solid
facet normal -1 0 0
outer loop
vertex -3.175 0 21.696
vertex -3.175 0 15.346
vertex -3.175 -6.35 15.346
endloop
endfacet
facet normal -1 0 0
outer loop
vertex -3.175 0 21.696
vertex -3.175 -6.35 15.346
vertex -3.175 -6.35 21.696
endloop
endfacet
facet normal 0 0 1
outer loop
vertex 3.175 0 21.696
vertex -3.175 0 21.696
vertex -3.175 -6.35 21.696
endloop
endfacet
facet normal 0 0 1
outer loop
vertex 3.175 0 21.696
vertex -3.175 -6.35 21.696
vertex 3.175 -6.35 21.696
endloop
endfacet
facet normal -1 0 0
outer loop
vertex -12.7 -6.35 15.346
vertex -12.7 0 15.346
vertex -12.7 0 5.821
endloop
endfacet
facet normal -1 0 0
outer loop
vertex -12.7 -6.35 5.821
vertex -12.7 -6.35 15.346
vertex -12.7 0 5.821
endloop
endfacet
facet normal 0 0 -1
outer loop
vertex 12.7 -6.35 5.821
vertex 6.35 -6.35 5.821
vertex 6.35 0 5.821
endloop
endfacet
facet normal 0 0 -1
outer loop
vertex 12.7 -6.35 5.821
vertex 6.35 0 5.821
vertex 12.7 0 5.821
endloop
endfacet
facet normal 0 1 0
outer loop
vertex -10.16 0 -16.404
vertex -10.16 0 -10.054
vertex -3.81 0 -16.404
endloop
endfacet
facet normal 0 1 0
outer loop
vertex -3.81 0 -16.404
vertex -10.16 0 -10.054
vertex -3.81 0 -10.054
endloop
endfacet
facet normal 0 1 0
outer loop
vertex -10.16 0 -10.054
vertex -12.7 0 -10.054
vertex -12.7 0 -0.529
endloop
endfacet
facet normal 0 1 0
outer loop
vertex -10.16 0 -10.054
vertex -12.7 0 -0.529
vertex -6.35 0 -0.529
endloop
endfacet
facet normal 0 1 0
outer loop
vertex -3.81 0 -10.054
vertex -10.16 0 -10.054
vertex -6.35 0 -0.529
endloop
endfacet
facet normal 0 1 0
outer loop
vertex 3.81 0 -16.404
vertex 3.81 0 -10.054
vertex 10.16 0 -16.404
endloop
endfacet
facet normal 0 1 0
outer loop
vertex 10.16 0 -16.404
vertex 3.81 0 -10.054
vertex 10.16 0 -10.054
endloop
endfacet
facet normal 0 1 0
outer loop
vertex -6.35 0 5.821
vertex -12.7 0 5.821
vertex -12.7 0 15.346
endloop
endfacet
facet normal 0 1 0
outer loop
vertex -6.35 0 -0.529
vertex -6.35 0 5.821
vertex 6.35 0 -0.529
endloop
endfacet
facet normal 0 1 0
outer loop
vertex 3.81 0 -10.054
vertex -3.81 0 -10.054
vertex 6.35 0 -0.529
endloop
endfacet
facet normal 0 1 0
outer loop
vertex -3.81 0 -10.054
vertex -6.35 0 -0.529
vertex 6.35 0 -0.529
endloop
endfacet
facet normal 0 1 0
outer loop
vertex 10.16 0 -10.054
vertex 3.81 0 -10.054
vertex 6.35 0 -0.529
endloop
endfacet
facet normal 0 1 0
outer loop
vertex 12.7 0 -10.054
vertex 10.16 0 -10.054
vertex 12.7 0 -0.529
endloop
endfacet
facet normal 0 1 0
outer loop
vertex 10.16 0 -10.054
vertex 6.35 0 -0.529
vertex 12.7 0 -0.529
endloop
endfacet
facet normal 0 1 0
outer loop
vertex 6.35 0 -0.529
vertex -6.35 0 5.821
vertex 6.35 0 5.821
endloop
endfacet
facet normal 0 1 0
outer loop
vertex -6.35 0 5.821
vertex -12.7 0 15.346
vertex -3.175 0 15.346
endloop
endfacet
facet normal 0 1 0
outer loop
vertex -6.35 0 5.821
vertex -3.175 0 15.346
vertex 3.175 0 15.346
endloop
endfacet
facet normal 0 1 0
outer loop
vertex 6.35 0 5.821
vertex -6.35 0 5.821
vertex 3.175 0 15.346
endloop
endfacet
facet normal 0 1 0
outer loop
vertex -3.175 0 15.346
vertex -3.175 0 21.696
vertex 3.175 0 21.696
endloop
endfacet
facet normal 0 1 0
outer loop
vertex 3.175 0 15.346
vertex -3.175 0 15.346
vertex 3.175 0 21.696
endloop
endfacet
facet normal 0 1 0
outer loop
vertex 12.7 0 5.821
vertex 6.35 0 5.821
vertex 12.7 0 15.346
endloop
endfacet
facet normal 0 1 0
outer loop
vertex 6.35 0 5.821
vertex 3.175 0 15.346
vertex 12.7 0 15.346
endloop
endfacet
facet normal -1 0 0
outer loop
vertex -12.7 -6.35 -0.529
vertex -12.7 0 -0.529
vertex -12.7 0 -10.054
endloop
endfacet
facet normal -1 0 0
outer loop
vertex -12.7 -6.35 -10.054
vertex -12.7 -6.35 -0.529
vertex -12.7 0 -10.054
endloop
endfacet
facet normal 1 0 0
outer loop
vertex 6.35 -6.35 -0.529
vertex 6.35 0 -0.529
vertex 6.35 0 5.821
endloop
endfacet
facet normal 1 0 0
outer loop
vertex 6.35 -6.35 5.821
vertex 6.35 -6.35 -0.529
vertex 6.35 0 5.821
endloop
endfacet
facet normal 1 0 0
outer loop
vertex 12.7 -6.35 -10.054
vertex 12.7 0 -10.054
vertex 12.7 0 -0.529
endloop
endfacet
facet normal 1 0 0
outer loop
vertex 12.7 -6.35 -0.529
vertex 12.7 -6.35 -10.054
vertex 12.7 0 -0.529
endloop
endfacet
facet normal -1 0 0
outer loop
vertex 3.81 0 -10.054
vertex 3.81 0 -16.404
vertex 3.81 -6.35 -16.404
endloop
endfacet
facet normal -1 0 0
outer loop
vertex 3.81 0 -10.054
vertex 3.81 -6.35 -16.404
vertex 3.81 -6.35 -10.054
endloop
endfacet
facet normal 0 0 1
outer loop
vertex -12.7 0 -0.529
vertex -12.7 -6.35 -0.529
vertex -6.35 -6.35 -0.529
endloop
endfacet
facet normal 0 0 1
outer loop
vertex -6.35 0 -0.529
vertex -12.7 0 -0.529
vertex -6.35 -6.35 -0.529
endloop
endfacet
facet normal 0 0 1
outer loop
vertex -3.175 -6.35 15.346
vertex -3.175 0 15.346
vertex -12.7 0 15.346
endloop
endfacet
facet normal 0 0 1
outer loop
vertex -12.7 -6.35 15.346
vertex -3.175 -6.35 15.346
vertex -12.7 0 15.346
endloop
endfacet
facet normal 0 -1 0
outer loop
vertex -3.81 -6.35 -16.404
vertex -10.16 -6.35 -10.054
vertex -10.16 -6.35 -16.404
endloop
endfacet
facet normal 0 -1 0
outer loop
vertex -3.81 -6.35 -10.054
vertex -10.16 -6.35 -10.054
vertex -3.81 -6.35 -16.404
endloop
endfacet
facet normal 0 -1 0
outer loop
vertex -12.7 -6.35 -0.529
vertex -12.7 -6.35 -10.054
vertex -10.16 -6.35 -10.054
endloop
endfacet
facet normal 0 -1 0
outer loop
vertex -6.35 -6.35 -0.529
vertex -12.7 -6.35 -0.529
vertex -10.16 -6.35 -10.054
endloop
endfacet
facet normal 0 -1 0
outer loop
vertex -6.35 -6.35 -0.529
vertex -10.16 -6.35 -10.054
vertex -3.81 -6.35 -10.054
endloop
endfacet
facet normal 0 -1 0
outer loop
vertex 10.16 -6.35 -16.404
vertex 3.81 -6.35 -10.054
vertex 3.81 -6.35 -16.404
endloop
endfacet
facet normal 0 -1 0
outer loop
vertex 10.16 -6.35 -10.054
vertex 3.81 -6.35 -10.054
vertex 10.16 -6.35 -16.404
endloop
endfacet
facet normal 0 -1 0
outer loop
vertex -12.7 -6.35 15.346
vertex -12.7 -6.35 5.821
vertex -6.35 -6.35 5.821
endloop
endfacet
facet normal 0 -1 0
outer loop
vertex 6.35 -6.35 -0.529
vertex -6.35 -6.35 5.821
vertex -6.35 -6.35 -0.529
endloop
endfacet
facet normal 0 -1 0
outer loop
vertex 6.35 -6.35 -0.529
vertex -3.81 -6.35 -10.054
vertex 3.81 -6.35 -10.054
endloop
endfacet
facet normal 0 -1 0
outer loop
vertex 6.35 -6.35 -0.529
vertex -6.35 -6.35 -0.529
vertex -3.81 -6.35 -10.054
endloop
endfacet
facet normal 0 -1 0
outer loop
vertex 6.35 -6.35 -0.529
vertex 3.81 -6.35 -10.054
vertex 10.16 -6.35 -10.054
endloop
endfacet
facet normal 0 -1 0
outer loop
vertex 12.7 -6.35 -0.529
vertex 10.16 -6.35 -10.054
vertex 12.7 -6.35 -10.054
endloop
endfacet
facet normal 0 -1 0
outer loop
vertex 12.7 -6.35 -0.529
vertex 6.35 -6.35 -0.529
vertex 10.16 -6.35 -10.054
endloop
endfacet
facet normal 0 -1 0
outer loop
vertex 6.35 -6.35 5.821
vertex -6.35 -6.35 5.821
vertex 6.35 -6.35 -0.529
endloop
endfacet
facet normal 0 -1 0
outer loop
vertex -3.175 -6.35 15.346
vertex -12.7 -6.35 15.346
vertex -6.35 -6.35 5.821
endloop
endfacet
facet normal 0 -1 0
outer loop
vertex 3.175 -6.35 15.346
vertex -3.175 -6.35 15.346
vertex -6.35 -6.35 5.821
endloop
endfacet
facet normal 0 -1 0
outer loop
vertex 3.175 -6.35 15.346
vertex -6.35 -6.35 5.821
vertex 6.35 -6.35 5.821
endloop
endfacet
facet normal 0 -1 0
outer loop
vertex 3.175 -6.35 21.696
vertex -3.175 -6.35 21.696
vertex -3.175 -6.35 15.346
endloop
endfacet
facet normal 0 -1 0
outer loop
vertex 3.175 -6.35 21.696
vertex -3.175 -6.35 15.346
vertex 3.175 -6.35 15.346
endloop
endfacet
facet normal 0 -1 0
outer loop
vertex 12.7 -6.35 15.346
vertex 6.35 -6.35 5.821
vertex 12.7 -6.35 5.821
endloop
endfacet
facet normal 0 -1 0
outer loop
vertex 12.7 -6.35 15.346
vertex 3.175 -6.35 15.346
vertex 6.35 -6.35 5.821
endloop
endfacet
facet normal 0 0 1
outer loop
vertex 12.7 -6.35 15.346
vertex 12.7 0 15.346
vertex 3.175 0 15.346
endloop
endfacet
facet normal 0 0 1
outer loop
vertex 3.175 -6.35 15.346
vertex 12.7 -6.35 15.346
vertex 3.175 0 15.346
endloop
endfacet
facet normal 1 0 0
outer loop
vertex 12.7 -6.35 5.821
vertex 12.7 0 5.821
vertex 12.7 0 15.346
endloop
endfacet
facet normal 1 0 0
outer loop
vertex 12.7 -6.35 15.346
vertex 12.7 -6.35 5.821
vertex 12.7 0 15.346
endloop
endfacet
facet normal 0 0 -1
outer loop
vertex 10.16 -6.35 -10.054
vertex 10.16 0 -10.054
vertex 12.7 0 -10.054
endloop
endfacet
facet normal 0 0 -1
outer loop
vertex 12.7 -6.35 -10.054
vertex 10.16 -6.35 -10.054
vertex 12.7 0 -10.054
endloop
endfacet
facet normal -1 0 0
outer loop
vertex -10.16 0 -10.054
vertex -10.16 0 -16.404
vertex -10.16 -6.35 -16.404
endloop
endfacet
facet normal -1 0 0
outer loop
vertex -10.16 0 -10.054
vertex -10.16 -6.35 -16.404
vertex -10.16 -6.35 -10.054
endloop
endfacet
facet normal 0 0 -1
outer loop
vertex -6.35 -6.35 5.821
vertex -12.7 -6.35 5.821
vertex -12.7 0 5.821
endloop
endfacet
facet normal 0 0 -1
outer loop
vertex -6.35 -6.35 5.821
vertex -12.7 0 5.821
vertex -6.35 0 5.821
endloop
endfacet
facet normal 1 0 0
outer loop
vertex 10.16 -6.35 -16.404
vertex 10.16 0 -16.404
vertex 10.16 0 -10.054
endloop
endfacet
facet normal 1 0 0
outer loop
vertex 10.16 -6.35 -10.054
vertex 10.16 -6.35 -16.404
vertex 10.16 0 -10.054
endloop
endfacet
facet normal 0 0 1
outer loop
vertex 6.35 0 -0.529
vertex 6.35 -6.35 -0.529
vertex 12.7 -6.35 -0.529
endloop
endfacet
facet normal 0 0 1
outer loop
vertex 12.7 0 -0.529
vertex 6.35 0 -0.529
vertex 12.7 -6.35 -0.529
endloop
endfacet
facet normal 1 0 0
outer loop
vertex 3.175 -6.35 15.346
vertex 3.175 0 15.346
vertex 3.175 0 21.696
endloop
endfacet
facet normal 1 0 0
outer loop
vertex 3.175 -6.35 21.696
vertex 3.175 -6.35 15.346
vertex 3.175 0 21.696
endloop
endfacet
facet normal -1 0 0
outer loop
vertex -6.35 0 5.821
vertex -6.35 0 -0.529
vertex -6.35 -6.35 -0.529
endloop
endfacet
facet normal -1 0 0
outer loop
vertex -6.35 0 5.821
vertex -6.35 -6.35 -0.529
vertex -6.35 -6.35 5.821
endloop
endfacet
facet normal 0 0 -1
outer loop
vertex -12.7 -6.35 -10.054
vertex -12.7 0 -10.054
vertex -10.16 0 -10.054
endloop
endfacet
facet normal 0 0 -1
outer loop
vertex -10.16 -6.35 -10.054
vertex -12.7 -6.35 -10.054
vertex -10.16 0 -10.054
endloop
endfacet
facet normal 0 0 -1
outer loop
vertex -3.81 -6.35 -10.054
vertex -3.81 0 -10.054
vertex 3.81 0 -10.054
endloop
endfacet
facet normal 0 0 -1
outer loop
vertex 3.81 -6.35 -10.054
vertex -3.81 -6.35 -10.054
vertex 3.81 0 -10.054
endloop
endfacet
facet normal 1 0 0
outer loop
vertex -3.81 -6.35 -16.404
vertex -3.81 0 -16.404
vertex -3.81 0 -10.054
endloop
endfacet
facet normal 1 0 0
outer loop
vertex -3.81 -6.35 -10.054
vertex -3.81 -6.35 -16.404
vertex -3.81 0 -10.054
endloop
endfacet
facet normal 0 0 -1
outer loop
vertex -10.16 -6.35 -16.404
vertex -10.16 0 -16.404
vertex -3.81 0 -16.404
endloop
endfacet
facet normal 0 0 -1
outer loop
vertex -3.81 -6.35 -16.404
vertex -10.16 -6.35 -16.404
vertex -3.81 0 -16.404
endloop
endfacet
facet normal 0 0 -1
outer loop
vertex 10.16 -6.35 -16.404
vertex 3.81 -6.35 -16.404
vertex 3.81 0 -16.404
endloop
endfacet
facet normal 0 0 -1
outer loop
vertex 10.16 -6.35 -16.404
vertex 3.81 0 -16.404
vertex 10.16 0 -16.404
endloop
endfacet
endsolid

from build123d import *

# Parameters (mm, degrees)
F0_W     = 6.35
F0_H     = 6.35
F1_DEPTH = 6.35
F2_DEPTH = 6.35


with BuildPart() as f1:
    # F0 (on Front) → F1 (new body)
    with BuildSketch(Plane.XZ):
        Polygon((-3.175, 15.345833), (-12.7, 15.345833), (-12.7, 5.820833), (-6.35, 5.820833), (-6.35, -0.529167), (-12.7, -0.529167), (-12.7, -10.054167), (-10.16, -10.054167), (-3.81, -10.054167), (3.81, -10.054167), (10.16, -10.054167), (12.7, -10.054167), (12.7, -0.529167), (6.35, -0.529167), (6.35, 5.820833), (12.7, 5.820833), (12.7, 15.345833), (3.175, 15.345833), align=None)
        with Locations((0, 18.520833)):
            Rectangle(F0_W, F0_H)
        with Locations((-9.525, 2.645833)):
            Rectangle(F0_W, F0_H)
        with Locations((9.525, 2.645833)):
            Rectangle(F0_W, F0_H)
        with Locations((-6.985, -13.229167)):
            Rectangle(F0_W, F0_H)
        with Locations((6.985, -13.229167)):
            Rectangle(F0_W, F0_H)
    extrude(amount=F1_DEPTH)

    # F0 (on Front) → F2 (cut)
    with BuildSketch(Plane.XZ):
        with Locations((-9.525, 2.645833)):
            Rectangle(F0_W, F0_H)
        with Locations((9.525, 2.645833)):
            Rectangle(F0_W, F0_H)
    extrude(amount=F2_DEPTH, mode=Mode.SUBTRACT)


solid = f1.part
